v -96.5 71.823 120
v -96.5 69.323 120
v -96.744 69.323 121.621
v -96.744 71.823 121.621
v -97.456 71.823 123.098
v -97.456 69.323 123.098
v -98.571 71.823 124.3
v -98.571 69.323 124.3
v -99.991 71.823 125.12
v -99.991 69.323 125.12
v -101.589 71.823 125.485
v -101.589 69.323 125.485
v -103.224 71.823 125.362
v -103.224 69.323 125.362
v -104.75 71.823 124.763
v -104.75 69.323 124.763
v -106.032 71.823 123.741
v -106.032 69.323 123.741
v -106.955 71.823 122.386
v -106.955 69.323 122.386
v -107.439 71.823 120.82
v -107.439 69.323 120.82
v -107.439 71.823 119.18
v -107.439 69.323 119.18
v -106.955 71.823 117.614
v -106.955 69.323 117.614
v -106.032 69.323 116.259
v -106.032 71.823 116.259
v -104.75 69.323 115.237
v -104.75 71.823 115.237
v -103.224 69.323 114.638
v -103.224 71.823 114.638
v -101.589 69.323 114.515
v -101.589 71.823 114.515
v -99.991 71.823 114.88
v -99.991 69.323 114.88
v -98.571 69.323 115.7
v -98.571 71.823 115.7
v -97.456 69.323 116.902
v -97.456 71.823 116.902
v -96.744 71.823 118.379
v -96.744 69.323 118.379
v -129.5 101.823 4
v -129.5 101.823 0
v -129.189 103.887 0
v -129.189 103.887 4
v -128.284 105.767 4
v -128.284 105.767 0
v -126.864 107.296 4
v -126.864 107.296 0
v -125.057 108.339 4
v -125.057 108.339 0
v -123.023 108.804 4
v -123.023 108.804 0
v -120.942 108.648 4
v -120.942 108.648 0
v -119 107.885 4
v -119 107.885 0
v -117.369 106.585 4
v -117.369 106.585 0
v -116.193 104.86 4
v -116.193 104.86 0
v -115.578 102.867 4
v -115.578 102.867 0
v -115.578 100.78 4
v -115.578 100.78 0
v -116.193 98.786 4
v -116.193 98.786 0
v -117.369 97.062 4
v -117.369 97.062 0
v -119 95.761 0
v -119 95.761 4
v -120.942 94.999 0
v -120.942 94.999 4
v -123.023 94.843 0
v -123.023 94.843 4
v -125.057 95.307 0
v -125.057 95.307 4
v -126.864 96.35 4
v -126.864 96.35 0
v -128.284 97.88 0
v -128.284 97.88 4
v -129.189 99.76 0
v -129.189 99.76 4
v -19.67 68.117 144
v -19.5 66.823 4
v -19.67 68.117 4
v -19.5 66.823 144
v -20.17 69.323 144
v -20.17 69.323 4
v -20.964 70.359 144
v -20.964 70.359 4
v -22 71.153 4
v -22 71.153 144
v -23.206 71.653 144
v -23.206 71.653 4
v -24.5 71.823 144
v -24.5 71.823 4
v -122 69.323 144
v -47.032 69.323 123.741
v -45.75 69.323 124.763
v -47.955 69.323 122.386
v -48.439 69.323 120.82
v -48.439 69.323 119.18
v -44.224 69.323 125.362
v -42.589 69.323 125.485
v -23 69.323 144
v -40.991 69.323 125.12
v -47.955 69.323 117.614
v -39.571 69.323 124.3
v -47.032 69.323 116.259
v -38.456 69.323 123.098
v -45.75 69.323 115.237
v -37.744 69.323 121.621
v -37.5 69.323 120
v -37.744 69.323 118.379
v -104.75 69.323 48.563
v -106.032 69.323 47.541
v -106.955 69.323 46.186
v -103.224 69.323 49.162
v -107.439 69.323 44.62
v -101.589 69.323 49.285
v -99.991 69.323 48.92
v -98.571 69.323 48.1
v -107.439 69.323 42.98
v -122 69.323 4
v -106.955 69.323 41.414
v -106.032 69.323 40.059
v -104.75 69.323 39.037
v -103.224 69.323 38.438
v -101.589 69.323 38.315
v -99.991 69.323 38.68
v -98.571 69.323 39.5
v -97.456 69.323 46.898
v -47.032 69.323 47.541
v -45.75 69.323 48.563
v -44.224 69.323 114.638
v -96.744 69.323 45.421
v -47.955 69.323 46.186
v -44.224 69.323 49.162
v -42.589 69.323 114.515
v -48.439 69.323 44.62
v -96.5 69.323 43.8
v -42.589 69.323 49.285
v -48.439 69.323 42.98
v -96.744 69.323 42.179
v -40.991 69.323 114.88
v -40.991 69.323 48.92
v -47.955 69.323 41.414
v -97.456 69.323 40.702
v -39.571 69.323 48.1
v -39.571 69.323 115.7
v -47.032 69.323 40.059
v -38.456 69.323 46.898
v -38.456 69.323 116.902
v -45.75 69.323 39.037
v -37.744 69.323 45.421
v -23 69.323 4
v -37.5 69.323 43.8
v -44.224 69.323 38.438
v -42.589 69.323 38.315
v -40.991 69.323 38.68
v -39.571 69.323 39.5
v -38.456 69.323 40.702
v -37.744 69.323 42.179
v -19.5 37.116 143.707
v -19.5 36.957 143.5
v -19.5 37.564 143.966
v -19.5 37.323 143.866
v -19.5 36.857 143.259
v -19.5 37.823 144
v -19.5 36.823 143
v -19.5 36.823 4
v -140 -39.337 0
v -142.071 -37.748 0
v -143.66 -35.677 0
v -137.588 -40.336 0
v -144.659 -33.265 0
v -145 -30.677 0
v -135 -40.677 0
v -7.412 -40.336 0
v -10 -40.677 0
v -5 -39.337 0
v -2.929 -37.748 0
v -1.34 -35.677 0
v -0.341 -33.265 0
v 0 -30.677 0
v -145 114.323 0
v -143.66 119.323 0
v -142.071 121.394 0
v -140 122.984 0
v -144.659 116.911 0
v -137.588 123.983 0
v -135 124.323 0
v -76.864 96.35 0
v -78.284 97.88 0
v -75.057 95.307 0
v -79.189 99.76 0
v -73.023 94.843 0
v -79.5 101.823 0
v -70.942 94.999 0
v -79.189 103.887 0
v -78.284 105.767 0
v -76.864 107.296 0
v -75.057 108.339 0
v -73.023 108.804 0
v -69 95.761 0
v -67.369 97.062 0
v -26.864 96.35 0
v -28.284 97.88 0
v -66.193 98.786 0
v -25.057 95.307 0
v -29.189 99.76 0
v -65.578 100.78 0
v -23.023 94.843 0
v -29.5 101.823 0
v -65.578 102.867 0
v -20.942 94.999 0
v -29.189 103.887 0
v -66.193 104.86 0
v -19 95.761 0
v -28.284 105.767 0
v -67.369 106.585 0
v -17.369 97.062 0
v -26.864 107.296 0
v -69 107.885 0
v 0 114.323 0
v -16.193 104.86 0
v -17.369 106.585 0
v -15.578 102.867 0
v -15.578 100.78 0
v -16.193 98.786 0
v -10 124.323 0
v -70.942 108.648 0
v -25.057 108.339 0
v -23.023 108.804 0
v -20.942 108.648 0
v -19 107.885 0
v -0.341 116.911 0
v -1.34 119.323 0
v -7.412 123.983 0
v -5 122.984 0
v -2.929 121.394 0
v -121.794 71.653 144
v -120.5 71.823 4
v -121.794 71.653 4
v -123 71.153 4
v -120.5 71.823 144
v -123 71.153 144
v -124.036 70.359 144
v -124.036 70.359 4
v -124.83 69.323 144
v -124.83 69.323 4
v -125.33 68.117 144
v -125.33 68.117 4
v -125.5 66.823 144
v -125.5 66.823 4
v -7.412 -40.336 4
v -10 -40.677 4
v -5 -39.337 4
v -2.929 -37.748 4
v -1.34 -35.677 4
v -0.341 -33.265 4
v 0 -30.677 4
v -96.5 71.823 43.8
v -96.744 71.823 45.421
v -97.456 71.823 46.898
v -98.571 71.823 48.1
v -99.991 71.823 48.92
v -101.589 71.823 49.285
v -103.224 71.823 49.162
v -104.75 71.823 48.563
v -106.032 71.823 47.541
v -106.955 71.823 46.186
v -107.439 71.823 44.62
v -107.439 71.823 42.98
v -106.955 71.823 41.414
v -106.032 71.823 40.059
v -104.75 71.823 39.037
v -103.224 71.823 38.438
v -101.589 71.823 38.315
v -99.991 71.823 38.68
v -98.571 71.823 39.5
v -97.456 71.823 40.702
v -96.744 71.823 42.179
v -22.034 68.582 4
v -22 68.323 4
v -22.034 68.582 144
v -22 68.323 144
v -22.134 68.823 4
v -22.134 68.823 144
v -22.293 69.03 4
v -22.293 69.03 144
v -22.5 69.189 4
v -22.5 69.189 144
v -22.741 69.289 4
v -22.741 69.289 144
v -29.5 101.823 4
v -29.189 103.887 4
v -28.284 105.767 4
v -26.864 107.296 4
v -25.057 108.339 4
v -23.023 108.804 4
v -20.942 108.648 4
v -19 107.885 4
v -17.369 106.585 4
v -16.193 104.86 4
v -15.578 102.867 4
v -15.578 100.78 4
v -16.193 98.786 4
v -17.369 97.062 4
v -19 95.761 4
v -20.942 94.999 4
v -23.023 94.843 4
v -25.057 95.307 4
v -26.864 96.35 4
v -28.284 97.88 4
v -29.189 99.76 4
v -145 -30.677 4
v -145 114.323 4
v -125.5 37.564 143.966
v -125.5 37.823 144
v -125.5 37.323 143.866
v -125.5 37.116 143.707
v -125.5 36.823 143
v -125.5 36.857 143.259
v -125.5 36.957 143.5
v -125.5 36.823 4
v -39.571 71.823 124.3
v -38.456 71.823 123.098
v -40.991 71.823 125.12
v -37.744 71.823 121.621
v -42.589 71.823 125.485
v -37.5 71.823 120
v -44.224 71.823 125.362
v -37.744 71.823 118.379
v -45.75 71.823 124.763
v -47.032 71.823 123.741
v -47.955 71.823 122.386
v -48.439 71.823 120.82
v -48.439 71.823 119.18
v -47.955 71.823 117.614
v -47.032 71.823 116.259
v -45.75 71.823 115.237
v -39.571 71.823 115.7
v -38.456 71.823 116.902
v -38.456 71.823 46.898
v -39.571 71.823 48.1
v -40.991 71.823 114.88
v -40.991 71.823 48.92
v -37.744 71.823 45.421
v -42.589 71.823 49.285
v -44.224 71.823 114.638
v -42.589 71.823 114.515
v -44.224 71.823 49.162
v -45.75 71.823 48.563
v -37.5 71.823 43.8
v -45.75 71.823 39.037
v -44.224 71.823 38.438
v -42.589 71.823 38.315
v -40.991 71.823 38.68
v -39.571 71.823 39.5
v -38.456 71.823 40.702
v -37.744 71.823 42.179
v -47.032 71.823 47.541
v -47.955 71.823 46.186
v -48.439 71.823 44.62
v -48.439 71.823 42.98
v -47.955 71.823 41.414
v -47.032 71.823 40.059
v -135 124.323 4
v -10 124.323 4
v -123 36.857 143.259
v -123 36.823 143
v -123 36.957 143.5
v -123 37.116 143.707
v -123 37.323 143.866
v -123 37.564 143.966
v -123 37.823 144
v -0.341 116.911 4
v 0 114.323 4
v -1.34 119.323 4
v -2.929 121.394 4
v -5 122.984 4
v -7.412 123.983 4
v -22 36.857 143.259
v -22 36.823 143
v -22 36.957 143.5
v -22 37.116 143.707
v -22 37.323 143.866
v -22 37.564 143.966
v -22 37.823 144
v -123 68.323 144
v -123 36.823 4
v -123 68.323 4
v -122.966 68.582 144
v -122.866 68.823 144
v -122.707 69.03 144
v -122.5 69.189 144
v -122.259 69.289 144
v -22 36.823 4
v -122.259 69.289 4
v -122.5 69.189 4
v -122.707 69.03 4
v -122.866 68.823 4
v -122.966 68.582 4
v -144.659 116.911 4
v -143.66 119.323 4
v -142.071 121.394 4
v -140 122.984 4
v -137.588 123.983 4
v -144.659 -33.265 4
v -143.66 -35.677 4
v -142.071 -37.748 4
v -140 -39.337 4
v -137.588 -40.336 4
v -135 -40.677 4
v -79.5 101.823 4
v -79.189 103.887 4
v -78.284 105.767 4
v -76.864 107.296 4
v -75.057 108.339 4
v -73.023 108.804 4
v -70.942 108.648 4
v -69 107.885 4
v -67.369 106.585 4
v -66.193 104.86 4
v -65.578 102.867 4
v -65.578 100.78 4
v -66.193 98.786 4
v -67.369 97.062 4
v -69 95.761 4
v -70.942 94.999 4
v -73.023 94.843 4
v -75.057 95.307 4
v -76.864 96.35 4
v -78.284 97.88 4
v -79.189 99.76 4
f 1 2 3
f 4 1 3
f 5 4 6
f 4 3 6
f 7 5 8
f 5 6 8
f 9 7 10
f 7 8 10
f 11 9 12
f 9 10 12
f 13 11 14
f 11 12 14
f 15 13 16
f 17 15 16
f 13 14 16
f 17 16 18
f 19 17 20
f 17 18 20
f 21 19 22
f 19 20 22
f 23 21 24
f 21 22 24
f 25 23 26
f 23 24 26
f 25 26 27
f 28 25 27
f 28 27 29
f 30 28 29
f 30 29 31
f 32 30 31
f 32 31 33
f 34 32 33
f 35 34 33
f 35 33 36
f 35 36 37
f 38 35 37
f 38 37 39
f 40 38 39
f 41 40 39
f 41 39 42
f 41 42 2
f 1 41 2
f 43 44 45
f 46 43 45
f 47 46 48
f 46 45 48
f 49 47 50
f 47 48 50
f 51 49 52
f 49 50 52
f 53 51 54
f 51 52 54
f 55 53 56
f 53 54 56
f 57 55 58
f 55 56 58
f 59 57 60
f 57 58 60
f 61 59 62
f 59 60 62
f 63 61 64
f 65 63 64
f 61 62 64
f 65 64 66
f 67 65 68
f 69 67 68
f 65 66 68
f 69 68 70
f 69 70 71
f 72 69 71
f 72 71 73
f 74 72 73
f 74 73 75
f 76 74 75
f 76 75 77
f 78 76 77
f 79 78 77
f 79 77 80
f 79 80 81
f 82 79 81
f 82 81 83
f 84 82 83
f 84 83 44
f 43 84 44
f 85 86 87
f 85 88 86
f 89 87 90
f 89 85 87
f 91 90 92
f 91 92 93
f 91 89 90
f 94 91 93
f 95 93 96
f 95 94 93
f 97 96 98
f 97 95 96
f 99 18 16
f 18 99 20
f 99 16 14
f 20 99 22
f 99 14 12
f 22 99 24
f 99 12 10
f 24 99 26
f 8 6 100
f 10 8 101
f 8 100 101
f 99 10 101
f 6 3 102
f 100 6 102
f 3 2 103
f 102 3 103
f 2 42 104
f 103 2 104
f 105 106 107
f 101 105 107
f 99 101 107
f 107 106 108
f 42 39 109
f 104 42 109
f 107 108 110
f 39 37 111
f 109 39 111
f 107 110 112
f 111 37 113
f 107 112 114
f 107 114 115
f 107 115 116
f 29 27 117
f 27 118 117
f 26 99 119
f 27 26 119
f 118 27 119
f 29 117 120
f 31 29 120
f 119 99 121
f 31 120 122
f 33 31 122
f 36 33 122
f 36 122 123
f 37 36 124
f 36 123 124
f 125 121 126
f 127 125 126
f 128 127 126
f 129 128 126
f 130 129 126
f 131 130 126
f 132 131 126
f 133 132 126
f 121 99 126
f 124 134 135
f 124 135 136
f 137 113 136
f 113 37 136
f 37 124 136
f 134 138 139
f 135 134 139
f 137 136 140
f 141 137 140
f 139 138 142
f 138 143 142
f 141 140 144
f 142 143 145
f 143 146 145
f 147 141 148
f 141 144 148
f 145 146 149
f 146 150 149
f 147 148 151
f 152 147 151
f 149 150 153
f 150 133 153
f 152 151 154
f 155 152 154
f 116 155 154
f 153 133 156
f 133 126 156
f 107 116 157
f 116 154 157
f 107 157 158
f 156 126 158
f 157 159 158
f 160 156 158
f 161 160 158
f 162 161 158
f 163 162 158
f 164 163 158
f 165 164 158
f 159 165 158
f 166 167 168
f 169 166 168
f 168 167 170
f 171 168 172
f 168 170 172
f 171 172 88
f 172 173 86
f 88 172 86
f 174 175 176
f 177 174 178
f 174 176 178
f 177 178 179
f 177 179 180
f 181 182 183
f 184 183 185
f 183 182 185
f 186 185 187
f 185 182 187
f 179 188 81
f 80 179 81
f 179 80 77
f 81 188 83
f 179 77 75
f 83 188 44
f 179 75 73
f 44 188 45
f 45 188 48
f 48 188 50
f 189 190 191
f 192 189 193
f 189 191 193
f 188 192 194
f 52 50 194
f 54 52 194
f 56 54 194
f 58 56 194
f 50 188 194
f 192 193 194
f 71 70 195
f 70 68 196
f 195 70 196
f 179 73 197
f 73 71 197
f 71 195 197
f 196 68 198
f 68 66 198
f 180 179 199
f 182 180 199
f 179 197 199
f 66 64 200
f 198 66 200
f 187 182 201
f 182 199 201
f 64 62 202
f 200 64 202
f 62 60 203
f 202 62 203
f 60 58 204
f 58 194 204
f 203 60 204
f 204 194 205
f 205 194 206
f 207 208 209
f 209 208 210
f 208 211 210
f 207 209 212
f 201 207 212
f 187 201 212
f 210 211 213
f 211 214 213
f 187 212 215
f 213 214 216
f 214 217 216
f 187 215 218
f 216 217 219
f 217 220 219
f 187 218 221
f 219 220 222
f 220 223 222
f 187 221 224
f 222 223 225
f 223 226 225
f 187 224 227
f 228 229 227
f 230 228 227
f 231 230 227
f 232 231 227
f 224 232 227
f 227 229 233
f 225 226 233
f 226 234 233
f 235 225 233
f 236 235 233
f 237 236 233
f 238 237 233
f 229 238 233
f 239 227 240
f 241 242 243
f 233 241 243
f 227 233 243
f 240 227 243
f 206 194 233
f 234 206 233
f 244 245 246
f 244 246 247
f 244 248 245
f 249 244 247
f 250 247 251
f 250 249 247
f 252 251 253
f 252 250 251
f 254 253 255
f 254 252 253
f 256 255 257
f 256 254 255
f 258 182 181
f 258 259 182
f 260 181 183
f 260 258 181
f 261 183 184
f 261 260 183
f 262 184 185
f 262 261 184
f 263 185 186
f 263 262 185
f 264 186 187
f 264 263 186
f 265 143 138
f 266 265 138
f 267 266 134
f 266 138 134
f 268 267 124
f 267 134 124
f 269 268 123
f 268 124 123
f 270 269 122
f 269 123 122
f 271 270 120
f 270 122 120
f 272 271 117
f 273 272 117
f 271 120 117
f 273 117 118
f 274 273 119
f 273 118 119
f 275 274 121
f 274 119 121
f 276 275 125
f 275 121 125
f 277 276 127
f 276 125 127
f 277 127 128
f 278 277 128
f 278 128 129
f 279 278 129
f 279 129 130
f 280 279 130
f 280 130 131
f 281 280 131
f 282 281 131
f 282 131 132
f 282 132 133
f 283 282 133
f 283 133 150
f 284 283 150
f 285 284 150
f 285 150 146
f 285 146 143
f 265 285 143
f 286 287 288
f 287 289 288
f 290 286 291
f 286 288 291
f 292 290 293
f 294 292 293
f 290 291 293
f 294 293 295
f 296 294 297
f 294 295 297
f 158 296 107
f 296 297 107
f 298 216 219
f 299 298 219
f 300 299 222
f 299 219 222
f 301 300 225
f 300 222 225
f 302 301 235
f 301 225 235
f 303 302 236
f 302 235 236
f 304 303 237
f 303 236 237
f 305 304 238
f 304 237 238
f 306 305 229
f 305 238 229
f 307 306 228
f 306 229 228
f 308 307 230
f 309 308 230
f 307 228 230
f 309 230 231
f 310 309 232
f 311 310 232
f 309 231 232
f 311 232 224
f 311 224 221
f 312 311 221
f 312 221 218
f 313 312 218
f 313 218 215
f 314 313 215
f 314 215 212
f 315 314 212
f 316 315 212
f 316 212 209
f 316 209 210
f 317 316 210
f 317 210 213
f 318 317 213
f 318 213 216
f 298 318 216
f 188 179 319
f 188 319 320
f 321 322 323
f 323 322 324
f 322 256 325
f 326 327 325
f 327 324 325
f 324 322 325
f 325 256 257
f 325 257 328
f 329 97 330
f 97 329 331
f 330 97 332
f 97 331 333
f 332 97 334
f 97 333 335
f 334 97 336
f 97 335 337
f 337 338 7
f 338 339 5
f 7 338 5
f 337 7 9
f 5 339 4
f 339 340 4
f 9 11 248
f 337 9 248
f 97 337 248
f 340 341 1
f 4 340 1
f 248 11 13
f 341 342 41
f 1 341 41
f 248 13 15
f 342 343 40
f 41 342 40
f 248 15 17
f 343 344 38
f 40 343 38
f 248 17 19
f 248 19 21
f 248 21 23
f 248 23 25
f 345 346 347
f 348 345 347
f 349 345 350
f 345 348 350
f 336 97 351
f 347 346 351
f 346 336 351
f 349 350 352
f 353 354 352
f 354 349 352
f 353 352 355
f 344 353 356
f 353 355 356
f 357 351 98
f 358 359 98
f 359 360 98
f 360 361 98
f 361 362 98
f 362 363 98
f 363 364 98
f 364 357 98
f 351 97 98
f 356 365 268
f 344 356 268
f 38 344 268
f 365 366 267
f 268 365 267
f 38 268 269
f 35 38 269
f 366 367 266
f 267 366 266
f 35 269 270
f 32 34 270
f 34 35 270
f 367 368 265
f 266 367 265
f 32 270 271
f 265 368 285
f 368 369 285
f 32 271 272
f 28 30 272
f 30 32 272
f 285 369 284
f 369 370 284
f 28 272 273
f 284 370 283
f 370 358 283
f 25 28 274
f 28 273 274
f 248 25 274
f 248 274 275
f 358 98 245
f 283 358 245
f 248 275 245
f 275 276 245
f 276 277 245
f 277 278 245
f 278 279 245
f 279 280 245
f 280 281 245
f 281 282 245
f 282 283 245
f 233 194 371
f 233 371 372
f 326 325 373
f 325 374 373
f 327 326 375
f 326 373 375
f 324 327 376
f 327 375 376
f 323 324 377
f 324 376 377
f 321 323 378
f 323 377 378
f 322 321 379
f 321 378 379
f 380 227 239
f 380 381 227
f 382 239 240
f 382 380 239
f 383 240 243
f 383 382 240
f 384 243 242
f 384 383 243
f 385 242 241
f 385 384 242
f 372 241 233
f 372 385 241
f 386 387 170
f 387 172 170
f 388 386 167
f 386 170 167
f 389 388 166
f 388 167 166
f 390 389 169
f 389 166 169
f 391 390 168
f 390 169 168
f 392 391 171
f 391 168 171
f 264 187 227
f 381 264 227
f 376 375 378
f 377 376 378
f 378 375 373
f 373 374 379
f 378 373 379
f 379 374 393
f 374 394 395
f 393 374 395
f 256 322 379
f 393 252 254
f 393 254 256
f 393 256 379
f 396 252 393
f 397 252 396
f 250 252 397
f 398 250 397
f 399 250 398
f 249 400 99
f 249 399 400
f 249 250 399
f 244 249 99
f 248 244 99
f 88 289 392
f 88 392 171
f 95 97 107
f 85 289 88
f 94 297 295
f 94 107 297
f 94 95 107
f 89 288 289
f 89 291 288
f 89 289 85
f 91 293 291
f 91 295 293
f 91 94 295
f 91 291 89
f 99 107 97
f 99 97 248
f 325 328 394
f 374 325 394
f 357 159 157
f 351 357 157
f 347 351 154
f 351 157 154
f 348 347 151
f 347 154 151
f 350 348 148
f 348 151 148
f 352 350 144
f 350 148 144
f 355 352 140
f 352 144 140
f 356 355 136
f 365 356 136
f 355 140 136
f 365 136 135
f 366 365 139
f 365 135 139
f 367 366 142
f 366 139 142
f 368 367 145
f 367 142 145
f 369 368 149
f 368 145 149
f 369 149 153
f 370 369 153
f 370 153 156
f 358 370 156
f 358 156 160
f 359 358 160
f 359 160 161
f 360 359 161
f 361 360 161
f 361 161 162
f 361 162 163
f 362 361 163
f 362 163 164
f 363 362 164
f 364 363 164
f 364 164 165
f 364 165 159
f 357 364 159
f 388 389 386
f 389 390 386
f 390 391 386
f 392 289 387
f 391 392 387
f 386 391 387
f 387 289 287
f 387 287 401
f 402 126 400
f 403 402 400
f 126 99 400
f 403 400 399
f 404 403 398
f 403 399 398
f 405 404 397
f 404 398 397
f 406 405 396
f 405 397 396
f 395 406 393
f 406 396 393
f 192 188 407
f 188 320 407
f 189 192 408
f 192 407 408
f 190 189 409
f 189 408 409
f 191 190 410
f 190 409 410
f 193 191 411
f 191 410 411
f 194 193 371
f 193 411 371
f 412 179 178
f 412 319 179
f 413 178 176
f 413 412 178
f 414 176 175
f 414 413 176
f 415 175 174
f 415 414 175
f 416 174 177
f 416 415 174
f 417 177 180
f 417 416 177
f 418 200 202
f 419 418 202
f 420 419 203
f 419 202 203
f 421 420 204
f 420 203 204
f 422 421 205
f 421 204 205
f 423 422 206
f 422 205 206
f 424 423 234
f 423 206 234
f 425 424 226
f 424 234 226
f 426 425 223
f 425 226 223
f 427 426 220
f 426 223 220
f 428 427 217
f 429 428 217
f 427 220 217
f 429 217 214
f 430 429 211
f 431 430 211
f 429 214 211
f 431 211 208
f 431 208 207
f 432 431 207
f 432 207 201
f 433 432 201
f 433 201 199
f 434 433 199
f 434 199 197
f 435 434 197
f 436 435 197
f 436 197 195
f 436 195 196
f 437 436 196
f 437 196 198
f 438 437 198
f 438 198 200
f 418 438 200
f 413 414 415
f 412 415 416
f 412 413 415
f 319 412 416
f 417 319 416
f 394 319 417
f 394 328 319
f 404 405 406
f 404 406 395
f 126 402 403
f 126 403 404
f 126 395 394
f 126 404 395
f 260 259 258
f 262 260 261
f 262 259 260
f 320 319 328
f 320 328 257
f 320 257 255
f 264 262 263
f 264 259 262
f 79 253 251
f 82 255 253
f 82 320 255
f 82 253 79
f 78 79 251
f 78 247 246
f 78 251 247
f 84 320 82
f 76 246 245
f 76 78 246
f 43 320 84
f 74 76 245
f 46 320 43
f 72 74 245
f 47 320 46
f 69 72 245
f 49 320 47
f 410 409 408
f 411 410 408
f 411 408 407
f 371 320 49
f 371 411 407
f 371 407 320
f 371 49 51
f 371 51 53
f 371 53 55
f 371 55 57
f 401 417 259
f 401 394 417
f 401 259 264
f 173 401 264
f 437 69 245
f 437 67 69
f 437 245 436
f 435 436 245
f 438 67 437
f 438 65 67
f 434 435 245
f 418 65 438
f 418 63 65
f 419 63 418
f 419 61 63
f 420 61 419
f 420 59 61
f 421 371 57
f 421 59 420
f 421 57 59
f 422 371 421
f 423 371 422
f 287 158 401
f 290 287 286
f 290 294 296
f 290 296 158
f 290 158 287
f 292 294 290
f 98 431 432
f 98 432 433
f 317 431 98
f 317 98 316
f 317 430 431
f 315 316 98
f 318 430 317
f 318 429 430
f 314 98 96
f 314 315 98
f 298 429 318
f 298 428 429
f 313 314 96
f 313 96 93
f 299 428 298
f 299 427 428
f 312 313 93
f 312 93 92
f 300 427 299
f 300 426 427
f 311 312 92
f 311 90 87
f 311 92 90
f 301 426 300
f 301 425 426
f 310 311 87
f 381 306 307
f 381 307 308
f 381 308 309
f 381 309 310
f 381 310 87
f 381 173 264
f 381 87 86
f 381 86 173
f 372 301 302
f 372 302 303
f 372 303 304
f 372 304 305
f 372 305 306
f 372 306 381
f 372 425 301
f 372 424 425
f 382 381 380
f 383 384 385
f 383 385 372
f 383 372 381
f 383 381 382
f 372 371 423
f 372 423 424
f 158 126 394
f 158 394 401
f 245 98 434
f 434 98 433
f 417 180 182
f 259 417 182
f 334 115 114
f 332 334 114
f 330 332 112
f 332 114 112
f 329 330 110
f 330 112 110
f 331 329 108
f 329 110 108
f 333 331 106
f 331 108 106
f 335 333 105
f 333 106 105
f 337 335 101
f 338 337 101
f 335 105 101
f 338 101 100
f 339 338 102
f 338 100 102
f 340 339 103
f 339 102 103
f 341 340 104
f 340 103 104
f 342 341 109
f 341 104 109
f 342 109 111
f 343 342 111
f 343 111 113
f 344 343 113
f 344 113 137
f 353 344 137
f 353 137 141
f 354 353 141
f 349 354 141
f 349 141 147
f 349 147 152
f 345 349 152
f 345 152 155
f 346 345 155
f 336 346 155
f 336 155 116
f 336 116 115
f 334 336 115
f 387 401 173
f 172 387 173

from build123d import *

# Parameters (mm, degrees)
F0_W     = 145
F0_H     = 165
F1_DEPTH = 4
F2_R     = 10
F4_DEPTH = 140
F5_R     = 5
F6_R     = 1
F7_R     = 1
F9_D     = 14
F11_D    = 11


with BuildPart() as f1:
    # F0 (on Top) → F1 (new body)
    with BuildSketch(Plane.XY):
        with Locations((-72.5, 41.823306)):
            Rectangle(F0_W, F0_H)
    extrude(amount=F1_DEPTH)

    # F2
    f2_edges = [f1.edges().sort_by_distance(p)[0] for p in [
        (0, -40.676694, 2),
        (0, 124.323306, 2),
        (-145, 124.323306, 2),
        (-145, -40.676694, 2),
    ]]
    fillet(f2_edges, radius=F2_R)

    # F3 (on face) → F4 (join)
    with BuildSketch(Plane.XY.offset(4)):
        Polygon((-19.5, 36.823306), (-19.5, 71.823306), (-125.5, 71.823306), (-125.5, 36.823306), (-123, 36.823306), (-123, 69.323306), (-22, 69.323306), (-22, 36.823306), align=None)
    extrude(amount=F4_DEPTH)

    # F5
    f5_edges = [f1.edges().sort_by_distance(p)[0] for p in [
        (-125.5, 71.823306, 74),
        (-19.5, 71.823306, 74),
    ]]
    fillet(f5_edges, radius=F5_R)

    # F6
    f6_edges = [f1.edges().sort_by_distance(p)[0] for p in [
        (-22, 69.323306, 74),
        (-123, 69.323306, 74),
    ]]
    fillet(f6_edges, radius=F6_R)

    # F7
    f7_edges = [f1.edges().sort_by_distance(p)[0] for p in [
        (-124.25, 36.823306, 144),
        (-20.75, 36.823306, 144),
    ]]
    fillet(f7_edges, radius=F7_R)

    # F9 (through all)
    with Locations(Plane.XY.offset(4)):
        with Locations((-22.5, 101.823306), (-72.5, 101.823306), (-122.5, 101.823306)):
            Hole(F9_D / 2)

    # F11 (through all)
    with Locations(Plane(origin=(0, 71.823306, 0), x_dir=(-1, 0, 0), z_dir=(0, 1, 0))):
        with Locations((102, 120), (43, 120), (43, 43.8), (102, 43.8)):
            Hole(F11_D / 2)


solid = f1.part
